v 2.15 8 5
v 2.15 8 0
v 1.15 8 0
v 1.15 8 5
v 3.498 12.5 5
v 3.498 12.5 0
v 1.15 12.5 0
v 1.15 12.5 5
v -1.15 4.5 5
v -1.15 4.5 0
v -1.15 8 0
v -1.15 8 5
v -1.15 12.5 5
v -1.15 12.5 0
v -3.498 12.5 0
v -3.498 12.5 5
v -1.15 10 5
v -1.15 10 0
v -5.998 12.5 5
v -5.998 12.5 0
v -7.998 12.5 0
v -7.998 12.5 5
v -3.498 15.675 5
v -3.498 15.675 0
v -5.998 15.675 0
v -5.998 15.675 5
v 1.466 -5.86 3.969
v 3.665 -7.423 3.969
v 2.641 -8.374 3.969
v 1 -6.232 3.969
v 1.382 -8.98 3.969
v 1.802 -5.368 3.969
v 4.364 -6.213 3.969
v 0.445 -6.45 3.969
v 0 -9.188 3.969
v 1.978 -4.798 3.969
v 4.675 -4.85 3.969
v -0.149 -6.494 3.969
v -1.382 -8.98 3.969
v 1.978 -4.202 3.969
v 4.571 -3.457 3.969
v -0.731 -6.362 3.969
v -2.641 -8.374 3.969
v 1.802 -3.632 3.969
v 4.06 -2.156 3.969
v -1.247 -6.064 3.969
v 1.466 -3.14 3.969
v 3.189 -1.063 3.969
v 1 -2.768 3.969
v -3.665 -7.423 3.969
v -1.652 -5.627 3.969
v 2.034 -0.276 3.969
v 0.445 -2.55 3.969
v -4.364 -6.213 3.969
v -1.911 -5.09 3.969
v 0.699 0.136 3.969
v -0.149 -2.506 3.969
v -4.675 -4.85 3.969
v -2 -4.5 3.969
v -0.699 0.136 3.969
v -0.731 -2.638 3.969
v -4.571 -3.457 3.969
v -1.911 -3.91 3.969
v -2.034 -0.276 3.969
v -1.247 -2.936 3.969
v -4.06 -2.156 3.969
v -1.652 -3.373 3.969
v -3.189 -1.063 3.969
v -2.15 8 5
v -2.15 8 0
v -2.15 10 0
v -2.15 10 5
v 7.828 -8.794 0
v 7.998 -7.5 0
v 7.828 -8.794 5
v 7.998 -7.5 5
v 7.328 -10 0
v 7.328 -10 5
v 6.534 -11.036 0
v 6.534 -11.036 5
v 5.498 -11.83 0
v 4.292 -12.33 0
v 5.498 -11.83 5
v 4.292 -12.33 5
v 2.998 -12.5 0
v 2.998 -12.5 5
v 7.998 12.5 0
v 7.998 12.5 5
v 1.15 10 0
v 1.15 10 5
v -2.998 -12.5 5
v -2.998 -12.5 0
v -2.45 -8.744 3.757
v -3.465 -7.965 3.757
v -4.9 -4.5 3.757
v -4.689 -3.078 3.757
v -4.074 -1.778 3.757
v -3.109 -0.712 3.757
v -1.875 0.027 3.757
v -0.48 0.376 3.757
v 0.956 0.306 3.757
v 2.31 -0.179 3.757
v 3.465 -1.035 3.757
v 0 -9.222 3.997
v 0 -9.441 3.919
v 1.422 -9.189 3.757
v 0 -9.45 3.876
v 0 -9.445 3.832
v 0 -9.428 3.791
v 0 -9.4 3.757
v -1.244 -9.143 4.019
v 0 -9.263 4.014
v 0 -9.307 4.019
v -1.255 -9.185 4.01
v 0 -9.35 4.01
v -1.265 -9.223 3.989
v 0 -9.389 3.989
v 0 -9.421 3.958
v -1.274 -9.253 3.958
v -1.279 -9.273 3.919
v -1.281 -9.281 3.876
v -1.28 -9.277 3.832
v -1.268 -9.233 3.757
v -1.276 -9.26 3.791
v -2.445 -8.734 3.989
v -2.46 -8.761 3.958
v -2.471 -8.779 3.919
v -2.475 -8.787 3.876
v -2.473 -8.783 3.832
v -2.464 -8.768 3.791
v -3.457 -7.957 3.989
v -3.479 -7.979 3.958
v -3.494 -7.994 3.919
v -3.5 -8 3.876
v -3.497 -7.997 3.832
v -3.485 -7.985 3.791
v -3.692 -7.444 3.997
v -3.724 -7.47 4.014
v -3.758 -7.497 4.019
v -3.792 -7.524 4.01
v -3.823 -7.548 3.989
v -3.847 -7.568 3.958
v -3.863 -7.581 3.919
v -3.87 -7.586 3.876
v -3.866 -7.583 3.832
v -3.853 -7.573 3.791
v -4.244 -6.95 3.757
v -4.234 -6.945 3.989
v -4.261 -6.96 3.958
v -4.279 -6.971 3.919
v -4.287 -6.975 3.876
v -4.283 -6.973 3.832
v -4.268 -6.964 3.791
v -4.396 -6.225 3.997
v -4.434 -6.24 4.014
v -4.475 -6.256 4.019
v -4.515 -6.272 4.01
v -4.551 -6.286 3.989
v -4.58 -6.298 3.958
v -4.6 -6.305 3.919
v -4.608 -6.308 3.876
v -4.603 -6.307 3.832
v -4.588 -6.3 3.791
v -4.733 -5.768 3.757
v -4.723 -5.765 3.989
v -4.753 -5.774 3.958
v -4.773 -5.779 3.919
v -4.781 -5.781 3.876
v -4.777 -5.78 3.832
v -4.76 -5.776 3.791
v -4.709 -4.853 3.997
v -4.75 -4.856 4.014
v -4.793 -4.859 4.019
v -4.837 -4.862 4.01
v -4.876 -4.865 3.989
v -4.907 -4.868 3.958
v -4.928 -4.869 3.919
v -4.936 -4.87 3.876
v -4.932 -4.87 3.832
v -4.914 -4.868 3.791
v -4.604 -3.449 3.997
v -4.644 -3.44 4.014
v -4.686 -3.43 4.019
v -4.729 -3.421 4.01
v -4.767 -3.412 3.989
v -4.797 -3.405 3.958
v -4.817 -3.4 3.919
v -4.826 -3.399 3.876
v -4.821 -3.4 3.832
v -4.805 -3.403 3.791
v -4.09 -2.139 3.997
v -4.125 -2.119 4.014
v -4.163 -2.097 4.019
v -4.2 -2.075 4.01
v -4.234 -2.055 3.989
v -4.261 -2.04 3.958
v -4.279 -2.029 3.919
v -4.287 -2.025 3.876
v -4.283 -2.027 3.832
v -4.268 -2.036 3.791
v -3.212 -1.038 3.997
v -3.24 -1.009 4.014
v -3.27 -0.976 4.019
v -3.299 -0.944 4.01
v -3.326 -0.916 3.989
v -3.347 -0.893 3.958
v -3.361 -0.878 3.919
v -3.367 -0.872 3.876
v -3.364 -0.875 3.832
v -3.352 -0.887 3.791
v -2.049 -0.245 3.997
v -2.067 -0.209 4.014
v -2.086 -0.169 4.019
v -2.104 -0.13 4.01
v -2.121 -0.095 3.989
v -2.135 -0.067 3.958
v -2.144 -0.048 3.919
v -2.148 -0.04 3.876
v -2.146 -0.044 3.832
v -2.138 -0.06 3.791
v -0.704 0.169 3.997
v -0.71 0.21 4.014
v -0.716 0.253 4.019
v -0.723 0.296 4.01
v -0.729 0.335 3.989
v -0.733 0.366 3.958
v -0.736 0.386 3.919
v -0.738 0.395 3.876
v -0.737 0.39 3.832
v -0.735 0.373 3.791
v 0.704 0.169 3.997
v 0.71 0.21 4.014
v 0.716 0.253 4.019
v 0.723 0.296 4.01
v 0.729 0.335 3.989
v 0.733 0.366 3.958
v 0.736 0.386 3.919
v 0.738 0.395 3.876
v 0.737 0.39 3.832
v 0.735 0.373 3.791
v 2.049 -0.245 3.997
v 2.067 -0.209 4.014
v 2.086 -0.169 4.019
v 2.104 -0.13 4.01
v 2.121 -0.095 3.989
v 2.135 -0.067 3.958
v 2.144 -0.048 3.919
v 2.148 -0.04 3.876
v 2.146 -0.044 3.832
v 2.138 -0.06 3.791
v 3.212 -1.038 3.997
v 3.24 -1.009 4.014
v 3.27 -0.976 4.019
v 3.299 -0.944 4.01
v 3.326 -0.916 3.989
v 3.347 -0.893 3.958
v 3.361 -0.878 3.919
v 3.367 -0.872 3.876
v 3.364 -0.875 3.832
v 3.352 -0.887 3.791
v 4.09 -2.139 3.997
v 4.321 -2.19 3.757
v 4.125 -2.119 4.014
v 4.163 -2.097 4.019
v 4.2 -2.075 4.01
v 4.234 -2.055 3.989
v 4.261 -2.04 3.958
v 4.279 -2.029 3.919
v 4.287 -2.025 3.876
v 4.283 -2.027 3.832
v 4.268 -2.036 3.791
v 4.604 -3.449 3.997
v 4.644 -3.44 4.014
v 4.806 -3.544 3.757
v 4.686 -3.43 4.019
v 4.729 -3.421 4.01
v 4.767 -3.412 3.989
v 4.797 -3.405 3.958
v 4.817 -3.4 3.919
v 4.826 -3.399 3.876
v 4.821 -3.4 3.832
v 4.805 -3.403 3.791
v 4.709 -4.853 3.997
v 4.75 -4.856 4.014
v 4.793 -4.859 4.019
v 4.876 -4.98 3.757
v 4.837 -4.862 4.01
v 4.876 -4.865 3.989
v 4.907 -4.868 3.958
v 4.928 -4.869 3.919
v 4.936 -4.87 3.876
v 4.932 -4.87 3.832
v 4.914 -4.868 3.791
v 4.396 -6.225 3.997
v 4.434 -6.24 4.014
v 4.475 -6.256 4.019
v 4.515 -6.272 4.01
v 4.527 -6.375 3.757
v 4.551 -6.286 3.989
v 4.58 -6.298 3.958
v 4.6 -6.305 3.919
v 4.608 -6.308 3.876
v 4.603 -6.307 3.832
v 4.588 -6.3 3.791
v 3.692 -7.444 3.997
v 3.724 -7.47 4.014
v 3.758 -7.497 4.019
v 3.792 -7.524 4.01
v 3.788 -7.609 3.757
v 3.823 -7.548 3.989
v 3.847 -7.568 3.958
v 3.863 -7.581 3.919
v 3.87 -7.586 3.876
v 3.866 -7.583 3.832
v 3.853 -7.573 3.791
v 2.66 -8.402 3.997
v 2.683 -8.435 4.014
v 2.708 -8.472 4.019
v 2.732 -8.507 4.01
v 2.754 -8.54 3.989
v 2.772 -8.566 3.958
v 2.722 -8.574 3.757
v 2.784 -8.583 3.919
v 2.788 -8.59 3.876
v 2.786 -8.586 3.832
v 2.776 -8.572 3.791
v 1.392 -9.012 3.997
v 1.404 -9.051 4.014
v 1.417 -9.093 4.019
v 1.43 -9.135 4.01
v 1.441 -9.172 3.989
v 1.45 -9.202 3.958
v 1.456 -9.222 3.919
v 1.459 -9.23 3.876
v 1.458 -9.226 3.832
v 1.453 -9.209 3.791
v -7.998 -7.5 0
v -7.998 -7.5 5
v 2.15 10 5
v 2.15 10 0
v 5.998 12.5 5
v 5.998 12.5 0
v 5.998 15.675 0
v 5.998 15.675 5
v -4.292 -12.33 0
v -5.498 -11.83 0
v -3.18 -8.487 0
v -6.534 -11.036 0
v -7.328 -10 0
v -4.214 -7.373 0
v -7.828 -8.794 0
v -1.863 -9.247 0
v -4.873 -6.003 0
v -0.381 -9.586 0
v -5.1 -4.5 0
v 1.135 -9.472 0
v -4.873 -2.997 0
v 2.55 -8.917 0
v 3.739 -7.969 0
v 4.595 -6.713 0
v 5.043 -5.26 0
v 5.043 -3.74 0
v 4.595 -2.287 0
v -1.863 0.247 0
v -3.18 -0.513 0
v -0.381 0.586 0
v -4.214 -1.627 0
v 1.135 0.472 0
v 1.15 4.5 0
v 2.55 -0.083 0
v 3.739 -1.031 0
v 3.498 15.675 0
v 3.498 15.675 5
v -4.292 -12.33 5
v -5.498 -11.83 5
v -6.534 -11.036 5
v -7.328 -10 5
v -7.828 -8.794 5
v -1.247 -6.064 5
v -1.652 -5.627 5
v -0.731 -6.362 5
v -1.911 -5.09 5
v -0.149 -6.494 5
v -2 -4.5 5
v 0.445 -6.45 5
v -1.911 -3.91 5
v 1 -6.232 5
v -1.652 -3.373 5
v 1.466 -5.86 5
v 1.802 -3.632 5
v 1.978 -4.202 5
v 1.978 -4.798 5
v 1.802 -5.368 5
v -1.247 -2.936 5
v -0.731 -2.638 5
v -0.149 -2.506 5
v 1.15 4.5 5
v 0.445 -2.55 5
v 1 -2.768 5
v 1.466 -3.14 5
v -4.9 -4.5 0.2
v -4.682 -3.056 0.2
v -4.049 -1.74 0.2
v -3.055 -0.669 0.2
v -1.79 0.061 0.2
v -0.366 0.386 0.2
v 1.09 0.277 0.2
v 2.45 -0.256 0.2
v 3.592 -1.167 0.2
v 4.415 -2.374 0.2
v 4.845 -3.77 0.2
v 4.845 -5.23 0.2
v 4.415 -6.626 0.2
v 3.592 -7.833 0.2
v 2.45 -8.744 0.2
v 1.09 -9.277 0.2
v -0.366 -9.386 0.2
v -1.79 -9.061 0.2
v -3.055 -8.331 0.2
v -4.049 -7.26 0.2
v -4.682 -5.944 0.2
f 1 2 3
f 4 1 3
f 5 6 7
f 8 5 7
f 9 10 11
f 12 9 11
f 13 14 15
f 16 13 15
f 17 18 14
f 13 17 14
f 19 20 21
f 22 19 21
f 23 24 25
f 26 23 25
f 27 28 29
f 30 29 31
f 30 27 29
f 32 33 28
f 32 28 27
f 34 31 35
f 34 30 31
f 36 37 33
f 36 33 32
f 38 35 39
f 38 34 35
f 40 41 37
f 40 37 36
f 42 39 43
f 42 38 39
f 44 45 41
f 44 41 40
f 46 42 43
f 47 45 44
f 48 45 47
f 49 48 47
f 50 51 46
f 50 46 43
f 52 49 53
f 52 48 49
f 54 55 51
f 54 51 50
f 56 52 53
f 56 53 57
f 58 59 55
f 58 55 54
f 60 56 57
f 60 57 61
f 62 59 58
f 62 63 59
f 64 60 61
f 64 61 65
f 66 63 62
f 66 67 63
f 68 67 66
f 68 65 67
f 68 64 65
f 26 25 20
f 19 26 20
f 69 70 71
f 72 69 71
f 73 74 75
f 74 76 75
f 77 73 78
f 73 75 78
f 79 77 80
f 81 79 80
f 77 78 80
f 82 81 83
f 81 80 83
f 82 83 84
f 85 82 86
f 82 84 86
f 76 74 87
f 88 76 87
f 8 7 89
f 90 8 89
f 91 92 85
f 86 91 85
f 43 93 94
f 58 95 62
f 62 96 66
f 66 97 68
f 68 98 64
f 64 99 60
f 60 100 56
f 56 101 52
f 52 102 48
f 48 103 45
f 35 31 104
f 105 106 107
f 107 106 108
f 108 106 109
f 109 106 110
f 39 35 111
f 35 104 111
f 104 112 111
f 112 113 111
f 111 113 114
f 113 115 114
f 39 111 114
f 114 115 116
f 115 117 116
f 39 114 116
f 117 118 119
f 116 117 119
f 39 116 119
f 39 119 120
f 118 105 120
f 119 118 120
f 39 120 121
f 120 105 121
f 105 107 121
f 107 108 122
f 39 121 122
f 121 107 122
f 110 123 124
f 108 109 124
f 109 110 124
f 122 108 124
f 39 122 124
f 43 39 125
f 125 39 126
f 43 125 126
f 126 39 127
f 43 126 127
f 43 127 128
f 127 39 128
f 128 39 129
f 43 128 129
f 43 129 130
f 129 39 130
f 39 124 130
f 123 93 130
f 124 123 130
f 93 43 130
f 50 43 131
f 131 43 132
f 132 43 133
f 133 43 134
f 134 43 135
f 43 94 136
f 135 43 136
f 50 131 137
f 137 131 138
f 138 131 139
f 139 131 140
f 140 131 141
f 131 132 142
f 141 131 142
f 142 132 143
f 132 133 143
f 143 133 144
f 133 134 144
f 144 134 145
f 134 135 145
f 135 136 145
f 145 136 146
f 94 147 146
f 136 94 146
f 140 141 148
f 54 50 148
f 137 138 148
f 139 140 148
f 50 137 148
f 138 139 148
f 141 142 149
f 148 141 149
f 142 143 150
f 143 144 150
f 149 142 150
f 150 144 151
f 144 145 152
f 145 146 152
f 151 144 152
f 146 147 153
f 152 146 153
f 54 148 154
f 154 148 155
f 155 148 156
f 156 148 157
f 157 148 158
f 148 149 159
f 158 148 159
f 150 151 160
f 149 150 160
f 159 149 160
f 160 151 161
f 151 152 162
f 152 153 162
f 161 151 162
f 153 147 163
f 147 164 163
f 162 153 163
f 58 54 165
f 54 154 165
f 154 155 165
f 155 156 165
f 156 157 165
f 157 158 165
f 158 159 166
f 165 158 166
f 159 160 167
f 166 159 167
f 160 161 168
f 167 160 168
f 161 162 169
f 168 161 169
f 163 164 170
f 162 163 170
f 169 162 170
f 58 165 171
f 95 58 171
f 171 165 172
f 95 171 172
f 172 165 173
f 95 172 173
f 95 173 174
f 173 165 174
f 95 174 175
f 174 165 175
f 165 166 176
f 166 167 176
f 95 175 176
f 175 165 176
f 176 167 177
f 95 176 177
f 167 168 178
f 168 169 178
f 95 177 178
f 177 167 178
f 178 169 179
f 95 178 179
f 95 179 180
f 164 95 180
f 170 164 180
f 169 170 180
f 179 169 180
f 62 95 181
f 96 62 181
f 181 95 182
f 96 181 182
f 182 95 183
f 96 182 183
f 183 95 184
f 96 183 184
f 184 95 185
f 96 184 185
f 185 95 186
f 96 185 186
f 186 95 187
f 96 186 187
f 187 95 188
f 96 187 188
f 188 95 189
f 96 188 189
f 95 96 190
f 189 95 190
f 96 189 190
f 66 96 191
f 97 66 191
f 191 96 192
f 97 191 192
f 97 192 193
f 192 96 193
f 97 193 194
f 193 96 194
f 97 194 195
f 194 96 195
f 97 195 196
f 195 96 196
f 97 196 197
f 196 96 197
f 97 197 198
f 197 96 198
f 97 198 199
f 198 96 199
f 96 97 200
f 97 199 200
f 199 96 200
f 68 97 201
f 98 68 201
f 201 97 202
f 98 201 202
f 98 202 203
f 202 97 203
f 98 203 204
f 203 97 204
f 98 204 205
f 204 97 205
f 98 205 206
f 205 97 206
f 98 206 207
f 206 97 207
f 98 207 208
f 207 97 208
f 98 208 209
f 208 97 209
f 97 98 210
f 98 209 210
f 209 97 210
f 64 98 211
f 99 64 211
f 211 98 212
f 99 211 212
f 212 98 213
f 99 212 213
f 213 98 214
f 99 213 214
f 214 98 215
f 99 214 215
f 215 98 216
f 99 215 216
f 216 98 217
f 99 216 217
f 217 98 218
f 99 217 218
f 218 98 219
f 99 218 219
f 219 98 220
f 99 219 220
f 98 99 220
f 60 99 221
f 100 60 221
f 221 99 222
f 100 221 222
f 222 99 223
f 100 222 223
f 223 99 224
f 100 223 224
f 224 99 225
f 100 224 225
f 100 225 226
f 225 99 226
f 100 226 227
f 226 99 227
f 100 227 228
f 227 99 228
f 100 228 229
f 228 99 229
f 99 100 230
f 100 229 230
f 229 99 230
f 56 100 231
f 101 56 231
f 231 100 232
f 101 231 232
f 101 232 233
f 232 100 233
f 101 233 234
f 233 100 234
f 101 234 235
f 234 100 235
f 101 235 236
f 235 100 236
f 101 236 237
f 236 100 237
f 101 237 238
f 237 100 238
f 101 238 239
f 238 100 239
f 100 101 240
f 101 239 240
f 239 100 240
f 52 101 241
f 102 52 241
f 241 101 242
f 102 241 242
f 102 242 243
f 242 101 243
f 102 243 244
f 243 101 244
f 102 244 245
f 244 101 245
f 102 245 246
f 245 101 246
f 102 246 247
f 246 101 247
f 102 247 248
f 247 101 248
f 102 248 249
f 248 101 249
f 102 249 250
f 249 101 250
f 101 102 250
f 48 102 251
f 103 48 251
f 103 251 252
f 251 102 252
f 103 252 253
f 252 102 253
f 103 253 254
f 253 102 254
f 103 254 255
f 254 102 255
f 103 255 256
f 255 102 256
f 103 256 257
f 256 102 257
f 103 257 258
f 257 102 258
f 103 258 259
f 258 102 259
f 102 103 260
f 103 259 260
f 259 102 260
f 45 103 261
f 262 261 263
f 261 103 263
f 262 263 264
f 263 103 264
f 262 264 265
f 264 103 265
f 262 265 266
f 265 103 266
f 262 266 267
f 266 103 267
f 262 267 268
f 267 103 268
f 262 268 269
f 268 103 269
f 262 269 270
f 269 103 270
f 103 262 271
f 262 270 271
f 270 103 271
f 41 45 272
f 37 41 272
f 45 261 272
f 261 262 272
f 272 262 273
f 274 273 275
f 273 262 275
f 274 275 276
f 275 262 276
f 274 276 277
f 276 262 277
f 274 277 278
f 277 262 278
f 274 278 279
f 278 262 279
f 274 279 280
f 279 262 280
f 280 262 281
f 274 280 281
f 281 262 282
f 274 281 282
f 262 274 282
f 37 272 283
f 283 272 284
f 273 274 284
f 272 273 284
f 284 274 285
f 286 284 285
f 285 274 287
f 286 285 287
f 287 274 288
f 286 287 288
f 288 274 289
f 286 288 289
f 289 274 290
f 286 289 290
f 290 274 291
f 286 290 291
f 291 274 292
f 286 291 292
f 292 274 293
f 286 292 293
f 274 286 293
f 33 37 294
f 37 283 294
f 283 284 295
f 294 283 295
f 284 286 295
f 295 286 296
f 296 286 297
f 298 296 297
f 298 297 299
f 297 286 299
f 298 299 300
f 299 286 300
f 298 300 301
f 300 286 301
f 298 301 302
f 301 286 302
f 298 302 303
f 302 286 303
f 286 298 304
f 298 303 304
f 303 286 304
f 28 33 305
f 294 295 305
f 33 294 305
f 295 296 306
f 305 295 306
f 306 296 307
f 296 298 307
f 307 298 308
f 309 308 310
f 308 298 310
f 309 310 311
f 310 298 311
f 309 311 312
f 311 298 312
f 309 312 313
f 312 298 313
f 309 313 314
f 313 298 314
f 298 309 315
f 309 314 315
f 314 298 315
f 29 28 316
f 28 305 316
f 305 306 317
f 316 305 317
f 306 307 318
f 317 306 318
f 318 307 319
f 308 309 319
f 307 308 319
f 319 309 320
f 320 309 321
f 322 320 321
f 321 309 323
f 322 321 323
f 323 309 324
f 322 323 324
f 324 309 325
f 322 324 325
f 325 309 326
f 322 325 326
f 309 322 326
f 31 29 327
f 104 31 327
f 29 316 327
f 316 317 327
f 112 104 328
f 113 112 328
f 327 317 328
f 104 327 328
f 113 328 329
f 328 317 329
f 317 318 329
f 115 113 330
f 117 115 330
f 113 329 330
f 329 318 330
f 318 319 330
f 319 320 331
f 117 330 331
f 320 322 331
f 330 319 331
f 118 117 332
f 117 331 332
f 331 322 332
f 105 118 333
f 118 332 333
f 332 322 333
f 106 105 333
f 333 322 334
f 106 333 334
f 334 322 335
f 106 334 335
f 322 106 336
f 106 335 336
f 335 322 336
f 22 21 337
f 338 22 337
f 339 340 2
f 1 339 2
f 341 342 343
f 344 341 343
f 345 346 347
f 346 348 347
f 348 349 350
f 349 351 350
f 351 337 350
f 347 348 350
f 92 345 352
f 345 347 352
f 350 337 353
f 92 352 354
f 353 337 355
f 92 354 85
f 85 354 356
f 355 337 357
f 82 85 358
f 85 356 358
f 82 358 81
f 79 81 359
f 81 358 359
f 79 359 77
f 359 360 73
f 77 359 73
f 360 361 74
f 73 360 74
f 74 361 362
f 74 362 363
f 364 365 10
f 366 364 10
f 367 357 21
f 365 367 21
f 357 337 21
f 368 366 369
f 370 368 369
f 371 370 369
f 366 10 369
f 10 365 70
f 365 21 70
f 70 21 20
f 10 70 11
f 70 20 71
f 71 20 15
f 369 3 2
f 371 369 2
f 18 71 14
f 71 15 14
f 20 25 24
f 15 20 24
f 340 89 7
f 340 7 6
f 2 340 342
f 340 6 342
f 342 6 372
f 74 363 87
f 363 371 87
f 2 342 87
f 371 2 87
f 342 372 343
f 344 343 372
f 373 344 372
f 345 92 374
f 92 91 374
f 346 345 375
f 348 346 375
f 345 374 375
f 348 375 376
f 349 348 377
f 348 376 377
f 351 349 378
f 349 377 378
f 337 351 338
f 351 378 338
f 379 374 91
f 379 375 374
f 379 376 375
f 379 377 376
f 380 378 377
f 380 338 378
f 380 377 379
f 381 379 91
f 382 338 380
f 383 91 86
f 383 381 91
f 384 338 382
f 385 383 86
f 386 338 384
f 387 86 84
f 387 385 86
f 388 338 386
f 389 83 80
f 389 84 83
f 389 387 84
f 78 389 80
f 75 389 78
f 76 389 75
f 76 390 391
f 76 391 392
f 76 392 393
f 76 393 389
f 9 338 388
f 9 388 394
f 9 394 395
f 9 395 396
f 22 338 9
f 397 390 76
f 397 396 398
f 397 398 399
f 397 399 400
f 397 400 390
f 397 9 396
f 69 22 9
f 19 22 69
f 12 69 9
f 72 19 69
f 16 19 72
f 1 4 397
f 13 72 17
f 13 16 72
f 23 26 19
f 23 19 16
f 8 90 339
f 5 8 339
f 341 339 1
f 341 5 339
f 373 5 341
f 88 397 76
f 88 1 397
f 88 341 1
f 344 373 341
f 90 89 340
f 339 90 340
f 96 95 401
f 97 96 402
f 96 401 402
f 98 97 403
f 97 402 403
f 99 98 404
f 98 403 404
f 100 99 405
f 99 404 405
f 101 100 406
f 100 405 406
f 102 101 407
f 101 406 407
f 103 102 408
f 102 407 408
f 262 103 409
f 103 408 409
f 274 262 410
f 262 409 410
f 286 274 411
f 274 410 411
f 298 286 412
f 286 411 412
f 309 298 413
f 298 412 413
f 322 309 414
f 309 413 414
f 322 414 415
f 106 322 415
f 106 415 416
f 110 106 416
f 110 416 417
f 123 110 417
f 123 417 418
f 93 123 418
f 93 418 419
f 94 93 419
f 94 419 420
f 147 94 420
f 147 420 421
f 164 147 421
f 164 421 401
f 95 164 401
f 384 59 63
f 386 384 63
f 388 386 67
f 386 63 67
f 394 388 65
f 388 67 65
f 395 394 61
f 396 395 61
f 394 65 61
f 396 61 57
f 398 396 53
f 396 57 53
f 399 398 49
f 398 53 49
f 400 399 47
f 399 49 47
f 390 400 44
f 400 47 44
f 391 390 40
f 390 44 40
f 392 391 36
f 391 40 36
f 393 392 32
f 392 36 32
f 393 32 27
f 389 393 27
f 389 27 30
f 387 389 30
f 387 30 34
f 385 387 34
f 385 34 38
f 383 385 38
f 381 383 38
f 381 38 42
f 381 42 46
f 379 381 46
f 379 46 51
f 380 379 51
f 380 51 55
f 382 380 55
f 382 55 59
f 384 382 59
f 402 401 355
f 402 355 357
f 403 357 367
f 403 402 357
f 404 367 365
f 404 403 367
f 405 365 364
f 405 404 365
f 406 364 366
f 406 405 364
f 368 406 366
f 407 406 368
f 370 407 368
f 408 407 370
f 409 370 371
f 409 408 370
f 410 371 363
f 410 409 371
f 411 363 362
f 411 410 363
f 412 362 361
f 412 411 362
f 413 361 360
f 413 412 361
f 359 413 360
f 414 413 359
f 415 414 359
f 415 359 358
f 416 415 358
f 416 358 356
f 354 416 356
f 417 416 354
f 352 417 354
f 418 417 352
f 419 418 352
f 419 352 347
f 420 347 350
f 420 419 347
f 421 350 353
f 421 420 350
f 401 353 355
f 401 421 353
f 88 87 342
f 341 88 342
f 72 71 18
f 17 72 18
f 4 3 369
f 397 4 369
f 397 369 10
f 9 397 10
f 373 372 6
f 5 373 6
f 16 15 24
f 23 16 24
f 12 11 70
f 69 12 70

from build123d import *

# Parameters (mm, degrees)
BOSS_EXTRUDE1_DEPTH = 5
SKETCH2_R           = 4.9
CUT_EXTRUDE1_DEPTH  = 3.96875
CUT_EXTRUDE2_REACH  = 3.031
SKETCH3_R           = 2
FILLET1_R           = 5
CHAMFER1_SIZE       = 0.2
SKETCH5_R           = 0.15


with BuildPart() as part:
    # Sketch1 → Boss-Extrude1 (new body)
    with BuildSketch(Plane.XY):
        Polygon((7.998, 12.5), (5.998, 12.5), (5.998, 15.675), (3.498, 15.675), (3.498, 12.5), (1.15, 12.5), (1.15, 10), (2.15, 10), (2.15, 8), (1.15, 8), (1.15, 4.5), (-1.15, 4.5), (-1.15, 8), (-2.15, 8), (-2.15, 10), (-1.15, 10), (-1.15, 12.5), (-3.498, 12.5), (-3.498, 15.675), (-5.998, 15.675), (-5.998, 12.5), (-7.998, 12.5), (-7.998, -12.5), (7.998, -12.5), align=None)
    extrude(amount=BOSS_EXTRUDE1_DEPTH)

    # Sketch2 → Cut-Extrude1 (cut)
    with BuildSketch(Plane(origin=(0, 0, 0), x_dir=(-1, 0, 0), z_dir=(0, 0, -1))):
        with Locations((0, -4.5)):
            Circle(SKETCH2_R)
    extrude(amount=-CUT_EXTRUDE1_DEPTH, mode=Mode.SUBTRACT)

    # Sketch3 → Cut-Extrude2 (cut, up to next)
    with BuildSketch(Plane(origin=(0, 0, 3.96875), x_dir=(-1, 0, 0), z_dir=(0, 0, -1)), mode=Mode.PRIVATE) as cut_extrude2_sk1:
        with Locations((0, -4.5)):
            Circle(SKETCH3_R)
    cut_extrude2_tool1 = extrude(cut_extrude2_sk1.sketch, amount=-CUT_EXTRUDE2_REACH, mode=Mode.PRIVATE) & part.part
    add(cut_extrude2_tool1.solids().sort_by_distance((0, -4.5, 3.96875))[0], mode=Mode.SUBTRACT)

    # Fillet1
    fillet1_edges = [part.edges().sort_by_distance(p)[0] for p in [
        (7.998, -12.5, 2.5),
        (-7.998, -12.5, 2.5),
    ]]
    fillet(fillet1_edges, radius=FILLET1_R)

    # Chamfer1
    chamfer1_edges = [part.edges().sort_by_distance(p)[0] for p in [
        (4.9, -4.5, 0),
    ]]
    chamfer(chamfer1_edges, length=CHAMFER1_SIZE)

    # Sketch5 → Cut-Revolve1 (revolve, cut)
    with BuildSketch(Plane(origin=(0, 0, 0), x_dir=(0, 0, -1), z_dir=(1, 0, 0))):
        with Locations((-3.86875, -9.3)):
            Circle(SKETCH5_R)
    revolve(axis=Axis((0, -4.5, 5), (0, 0, -1)), mode=Mode.SUBTRACT)


solid = part.part
